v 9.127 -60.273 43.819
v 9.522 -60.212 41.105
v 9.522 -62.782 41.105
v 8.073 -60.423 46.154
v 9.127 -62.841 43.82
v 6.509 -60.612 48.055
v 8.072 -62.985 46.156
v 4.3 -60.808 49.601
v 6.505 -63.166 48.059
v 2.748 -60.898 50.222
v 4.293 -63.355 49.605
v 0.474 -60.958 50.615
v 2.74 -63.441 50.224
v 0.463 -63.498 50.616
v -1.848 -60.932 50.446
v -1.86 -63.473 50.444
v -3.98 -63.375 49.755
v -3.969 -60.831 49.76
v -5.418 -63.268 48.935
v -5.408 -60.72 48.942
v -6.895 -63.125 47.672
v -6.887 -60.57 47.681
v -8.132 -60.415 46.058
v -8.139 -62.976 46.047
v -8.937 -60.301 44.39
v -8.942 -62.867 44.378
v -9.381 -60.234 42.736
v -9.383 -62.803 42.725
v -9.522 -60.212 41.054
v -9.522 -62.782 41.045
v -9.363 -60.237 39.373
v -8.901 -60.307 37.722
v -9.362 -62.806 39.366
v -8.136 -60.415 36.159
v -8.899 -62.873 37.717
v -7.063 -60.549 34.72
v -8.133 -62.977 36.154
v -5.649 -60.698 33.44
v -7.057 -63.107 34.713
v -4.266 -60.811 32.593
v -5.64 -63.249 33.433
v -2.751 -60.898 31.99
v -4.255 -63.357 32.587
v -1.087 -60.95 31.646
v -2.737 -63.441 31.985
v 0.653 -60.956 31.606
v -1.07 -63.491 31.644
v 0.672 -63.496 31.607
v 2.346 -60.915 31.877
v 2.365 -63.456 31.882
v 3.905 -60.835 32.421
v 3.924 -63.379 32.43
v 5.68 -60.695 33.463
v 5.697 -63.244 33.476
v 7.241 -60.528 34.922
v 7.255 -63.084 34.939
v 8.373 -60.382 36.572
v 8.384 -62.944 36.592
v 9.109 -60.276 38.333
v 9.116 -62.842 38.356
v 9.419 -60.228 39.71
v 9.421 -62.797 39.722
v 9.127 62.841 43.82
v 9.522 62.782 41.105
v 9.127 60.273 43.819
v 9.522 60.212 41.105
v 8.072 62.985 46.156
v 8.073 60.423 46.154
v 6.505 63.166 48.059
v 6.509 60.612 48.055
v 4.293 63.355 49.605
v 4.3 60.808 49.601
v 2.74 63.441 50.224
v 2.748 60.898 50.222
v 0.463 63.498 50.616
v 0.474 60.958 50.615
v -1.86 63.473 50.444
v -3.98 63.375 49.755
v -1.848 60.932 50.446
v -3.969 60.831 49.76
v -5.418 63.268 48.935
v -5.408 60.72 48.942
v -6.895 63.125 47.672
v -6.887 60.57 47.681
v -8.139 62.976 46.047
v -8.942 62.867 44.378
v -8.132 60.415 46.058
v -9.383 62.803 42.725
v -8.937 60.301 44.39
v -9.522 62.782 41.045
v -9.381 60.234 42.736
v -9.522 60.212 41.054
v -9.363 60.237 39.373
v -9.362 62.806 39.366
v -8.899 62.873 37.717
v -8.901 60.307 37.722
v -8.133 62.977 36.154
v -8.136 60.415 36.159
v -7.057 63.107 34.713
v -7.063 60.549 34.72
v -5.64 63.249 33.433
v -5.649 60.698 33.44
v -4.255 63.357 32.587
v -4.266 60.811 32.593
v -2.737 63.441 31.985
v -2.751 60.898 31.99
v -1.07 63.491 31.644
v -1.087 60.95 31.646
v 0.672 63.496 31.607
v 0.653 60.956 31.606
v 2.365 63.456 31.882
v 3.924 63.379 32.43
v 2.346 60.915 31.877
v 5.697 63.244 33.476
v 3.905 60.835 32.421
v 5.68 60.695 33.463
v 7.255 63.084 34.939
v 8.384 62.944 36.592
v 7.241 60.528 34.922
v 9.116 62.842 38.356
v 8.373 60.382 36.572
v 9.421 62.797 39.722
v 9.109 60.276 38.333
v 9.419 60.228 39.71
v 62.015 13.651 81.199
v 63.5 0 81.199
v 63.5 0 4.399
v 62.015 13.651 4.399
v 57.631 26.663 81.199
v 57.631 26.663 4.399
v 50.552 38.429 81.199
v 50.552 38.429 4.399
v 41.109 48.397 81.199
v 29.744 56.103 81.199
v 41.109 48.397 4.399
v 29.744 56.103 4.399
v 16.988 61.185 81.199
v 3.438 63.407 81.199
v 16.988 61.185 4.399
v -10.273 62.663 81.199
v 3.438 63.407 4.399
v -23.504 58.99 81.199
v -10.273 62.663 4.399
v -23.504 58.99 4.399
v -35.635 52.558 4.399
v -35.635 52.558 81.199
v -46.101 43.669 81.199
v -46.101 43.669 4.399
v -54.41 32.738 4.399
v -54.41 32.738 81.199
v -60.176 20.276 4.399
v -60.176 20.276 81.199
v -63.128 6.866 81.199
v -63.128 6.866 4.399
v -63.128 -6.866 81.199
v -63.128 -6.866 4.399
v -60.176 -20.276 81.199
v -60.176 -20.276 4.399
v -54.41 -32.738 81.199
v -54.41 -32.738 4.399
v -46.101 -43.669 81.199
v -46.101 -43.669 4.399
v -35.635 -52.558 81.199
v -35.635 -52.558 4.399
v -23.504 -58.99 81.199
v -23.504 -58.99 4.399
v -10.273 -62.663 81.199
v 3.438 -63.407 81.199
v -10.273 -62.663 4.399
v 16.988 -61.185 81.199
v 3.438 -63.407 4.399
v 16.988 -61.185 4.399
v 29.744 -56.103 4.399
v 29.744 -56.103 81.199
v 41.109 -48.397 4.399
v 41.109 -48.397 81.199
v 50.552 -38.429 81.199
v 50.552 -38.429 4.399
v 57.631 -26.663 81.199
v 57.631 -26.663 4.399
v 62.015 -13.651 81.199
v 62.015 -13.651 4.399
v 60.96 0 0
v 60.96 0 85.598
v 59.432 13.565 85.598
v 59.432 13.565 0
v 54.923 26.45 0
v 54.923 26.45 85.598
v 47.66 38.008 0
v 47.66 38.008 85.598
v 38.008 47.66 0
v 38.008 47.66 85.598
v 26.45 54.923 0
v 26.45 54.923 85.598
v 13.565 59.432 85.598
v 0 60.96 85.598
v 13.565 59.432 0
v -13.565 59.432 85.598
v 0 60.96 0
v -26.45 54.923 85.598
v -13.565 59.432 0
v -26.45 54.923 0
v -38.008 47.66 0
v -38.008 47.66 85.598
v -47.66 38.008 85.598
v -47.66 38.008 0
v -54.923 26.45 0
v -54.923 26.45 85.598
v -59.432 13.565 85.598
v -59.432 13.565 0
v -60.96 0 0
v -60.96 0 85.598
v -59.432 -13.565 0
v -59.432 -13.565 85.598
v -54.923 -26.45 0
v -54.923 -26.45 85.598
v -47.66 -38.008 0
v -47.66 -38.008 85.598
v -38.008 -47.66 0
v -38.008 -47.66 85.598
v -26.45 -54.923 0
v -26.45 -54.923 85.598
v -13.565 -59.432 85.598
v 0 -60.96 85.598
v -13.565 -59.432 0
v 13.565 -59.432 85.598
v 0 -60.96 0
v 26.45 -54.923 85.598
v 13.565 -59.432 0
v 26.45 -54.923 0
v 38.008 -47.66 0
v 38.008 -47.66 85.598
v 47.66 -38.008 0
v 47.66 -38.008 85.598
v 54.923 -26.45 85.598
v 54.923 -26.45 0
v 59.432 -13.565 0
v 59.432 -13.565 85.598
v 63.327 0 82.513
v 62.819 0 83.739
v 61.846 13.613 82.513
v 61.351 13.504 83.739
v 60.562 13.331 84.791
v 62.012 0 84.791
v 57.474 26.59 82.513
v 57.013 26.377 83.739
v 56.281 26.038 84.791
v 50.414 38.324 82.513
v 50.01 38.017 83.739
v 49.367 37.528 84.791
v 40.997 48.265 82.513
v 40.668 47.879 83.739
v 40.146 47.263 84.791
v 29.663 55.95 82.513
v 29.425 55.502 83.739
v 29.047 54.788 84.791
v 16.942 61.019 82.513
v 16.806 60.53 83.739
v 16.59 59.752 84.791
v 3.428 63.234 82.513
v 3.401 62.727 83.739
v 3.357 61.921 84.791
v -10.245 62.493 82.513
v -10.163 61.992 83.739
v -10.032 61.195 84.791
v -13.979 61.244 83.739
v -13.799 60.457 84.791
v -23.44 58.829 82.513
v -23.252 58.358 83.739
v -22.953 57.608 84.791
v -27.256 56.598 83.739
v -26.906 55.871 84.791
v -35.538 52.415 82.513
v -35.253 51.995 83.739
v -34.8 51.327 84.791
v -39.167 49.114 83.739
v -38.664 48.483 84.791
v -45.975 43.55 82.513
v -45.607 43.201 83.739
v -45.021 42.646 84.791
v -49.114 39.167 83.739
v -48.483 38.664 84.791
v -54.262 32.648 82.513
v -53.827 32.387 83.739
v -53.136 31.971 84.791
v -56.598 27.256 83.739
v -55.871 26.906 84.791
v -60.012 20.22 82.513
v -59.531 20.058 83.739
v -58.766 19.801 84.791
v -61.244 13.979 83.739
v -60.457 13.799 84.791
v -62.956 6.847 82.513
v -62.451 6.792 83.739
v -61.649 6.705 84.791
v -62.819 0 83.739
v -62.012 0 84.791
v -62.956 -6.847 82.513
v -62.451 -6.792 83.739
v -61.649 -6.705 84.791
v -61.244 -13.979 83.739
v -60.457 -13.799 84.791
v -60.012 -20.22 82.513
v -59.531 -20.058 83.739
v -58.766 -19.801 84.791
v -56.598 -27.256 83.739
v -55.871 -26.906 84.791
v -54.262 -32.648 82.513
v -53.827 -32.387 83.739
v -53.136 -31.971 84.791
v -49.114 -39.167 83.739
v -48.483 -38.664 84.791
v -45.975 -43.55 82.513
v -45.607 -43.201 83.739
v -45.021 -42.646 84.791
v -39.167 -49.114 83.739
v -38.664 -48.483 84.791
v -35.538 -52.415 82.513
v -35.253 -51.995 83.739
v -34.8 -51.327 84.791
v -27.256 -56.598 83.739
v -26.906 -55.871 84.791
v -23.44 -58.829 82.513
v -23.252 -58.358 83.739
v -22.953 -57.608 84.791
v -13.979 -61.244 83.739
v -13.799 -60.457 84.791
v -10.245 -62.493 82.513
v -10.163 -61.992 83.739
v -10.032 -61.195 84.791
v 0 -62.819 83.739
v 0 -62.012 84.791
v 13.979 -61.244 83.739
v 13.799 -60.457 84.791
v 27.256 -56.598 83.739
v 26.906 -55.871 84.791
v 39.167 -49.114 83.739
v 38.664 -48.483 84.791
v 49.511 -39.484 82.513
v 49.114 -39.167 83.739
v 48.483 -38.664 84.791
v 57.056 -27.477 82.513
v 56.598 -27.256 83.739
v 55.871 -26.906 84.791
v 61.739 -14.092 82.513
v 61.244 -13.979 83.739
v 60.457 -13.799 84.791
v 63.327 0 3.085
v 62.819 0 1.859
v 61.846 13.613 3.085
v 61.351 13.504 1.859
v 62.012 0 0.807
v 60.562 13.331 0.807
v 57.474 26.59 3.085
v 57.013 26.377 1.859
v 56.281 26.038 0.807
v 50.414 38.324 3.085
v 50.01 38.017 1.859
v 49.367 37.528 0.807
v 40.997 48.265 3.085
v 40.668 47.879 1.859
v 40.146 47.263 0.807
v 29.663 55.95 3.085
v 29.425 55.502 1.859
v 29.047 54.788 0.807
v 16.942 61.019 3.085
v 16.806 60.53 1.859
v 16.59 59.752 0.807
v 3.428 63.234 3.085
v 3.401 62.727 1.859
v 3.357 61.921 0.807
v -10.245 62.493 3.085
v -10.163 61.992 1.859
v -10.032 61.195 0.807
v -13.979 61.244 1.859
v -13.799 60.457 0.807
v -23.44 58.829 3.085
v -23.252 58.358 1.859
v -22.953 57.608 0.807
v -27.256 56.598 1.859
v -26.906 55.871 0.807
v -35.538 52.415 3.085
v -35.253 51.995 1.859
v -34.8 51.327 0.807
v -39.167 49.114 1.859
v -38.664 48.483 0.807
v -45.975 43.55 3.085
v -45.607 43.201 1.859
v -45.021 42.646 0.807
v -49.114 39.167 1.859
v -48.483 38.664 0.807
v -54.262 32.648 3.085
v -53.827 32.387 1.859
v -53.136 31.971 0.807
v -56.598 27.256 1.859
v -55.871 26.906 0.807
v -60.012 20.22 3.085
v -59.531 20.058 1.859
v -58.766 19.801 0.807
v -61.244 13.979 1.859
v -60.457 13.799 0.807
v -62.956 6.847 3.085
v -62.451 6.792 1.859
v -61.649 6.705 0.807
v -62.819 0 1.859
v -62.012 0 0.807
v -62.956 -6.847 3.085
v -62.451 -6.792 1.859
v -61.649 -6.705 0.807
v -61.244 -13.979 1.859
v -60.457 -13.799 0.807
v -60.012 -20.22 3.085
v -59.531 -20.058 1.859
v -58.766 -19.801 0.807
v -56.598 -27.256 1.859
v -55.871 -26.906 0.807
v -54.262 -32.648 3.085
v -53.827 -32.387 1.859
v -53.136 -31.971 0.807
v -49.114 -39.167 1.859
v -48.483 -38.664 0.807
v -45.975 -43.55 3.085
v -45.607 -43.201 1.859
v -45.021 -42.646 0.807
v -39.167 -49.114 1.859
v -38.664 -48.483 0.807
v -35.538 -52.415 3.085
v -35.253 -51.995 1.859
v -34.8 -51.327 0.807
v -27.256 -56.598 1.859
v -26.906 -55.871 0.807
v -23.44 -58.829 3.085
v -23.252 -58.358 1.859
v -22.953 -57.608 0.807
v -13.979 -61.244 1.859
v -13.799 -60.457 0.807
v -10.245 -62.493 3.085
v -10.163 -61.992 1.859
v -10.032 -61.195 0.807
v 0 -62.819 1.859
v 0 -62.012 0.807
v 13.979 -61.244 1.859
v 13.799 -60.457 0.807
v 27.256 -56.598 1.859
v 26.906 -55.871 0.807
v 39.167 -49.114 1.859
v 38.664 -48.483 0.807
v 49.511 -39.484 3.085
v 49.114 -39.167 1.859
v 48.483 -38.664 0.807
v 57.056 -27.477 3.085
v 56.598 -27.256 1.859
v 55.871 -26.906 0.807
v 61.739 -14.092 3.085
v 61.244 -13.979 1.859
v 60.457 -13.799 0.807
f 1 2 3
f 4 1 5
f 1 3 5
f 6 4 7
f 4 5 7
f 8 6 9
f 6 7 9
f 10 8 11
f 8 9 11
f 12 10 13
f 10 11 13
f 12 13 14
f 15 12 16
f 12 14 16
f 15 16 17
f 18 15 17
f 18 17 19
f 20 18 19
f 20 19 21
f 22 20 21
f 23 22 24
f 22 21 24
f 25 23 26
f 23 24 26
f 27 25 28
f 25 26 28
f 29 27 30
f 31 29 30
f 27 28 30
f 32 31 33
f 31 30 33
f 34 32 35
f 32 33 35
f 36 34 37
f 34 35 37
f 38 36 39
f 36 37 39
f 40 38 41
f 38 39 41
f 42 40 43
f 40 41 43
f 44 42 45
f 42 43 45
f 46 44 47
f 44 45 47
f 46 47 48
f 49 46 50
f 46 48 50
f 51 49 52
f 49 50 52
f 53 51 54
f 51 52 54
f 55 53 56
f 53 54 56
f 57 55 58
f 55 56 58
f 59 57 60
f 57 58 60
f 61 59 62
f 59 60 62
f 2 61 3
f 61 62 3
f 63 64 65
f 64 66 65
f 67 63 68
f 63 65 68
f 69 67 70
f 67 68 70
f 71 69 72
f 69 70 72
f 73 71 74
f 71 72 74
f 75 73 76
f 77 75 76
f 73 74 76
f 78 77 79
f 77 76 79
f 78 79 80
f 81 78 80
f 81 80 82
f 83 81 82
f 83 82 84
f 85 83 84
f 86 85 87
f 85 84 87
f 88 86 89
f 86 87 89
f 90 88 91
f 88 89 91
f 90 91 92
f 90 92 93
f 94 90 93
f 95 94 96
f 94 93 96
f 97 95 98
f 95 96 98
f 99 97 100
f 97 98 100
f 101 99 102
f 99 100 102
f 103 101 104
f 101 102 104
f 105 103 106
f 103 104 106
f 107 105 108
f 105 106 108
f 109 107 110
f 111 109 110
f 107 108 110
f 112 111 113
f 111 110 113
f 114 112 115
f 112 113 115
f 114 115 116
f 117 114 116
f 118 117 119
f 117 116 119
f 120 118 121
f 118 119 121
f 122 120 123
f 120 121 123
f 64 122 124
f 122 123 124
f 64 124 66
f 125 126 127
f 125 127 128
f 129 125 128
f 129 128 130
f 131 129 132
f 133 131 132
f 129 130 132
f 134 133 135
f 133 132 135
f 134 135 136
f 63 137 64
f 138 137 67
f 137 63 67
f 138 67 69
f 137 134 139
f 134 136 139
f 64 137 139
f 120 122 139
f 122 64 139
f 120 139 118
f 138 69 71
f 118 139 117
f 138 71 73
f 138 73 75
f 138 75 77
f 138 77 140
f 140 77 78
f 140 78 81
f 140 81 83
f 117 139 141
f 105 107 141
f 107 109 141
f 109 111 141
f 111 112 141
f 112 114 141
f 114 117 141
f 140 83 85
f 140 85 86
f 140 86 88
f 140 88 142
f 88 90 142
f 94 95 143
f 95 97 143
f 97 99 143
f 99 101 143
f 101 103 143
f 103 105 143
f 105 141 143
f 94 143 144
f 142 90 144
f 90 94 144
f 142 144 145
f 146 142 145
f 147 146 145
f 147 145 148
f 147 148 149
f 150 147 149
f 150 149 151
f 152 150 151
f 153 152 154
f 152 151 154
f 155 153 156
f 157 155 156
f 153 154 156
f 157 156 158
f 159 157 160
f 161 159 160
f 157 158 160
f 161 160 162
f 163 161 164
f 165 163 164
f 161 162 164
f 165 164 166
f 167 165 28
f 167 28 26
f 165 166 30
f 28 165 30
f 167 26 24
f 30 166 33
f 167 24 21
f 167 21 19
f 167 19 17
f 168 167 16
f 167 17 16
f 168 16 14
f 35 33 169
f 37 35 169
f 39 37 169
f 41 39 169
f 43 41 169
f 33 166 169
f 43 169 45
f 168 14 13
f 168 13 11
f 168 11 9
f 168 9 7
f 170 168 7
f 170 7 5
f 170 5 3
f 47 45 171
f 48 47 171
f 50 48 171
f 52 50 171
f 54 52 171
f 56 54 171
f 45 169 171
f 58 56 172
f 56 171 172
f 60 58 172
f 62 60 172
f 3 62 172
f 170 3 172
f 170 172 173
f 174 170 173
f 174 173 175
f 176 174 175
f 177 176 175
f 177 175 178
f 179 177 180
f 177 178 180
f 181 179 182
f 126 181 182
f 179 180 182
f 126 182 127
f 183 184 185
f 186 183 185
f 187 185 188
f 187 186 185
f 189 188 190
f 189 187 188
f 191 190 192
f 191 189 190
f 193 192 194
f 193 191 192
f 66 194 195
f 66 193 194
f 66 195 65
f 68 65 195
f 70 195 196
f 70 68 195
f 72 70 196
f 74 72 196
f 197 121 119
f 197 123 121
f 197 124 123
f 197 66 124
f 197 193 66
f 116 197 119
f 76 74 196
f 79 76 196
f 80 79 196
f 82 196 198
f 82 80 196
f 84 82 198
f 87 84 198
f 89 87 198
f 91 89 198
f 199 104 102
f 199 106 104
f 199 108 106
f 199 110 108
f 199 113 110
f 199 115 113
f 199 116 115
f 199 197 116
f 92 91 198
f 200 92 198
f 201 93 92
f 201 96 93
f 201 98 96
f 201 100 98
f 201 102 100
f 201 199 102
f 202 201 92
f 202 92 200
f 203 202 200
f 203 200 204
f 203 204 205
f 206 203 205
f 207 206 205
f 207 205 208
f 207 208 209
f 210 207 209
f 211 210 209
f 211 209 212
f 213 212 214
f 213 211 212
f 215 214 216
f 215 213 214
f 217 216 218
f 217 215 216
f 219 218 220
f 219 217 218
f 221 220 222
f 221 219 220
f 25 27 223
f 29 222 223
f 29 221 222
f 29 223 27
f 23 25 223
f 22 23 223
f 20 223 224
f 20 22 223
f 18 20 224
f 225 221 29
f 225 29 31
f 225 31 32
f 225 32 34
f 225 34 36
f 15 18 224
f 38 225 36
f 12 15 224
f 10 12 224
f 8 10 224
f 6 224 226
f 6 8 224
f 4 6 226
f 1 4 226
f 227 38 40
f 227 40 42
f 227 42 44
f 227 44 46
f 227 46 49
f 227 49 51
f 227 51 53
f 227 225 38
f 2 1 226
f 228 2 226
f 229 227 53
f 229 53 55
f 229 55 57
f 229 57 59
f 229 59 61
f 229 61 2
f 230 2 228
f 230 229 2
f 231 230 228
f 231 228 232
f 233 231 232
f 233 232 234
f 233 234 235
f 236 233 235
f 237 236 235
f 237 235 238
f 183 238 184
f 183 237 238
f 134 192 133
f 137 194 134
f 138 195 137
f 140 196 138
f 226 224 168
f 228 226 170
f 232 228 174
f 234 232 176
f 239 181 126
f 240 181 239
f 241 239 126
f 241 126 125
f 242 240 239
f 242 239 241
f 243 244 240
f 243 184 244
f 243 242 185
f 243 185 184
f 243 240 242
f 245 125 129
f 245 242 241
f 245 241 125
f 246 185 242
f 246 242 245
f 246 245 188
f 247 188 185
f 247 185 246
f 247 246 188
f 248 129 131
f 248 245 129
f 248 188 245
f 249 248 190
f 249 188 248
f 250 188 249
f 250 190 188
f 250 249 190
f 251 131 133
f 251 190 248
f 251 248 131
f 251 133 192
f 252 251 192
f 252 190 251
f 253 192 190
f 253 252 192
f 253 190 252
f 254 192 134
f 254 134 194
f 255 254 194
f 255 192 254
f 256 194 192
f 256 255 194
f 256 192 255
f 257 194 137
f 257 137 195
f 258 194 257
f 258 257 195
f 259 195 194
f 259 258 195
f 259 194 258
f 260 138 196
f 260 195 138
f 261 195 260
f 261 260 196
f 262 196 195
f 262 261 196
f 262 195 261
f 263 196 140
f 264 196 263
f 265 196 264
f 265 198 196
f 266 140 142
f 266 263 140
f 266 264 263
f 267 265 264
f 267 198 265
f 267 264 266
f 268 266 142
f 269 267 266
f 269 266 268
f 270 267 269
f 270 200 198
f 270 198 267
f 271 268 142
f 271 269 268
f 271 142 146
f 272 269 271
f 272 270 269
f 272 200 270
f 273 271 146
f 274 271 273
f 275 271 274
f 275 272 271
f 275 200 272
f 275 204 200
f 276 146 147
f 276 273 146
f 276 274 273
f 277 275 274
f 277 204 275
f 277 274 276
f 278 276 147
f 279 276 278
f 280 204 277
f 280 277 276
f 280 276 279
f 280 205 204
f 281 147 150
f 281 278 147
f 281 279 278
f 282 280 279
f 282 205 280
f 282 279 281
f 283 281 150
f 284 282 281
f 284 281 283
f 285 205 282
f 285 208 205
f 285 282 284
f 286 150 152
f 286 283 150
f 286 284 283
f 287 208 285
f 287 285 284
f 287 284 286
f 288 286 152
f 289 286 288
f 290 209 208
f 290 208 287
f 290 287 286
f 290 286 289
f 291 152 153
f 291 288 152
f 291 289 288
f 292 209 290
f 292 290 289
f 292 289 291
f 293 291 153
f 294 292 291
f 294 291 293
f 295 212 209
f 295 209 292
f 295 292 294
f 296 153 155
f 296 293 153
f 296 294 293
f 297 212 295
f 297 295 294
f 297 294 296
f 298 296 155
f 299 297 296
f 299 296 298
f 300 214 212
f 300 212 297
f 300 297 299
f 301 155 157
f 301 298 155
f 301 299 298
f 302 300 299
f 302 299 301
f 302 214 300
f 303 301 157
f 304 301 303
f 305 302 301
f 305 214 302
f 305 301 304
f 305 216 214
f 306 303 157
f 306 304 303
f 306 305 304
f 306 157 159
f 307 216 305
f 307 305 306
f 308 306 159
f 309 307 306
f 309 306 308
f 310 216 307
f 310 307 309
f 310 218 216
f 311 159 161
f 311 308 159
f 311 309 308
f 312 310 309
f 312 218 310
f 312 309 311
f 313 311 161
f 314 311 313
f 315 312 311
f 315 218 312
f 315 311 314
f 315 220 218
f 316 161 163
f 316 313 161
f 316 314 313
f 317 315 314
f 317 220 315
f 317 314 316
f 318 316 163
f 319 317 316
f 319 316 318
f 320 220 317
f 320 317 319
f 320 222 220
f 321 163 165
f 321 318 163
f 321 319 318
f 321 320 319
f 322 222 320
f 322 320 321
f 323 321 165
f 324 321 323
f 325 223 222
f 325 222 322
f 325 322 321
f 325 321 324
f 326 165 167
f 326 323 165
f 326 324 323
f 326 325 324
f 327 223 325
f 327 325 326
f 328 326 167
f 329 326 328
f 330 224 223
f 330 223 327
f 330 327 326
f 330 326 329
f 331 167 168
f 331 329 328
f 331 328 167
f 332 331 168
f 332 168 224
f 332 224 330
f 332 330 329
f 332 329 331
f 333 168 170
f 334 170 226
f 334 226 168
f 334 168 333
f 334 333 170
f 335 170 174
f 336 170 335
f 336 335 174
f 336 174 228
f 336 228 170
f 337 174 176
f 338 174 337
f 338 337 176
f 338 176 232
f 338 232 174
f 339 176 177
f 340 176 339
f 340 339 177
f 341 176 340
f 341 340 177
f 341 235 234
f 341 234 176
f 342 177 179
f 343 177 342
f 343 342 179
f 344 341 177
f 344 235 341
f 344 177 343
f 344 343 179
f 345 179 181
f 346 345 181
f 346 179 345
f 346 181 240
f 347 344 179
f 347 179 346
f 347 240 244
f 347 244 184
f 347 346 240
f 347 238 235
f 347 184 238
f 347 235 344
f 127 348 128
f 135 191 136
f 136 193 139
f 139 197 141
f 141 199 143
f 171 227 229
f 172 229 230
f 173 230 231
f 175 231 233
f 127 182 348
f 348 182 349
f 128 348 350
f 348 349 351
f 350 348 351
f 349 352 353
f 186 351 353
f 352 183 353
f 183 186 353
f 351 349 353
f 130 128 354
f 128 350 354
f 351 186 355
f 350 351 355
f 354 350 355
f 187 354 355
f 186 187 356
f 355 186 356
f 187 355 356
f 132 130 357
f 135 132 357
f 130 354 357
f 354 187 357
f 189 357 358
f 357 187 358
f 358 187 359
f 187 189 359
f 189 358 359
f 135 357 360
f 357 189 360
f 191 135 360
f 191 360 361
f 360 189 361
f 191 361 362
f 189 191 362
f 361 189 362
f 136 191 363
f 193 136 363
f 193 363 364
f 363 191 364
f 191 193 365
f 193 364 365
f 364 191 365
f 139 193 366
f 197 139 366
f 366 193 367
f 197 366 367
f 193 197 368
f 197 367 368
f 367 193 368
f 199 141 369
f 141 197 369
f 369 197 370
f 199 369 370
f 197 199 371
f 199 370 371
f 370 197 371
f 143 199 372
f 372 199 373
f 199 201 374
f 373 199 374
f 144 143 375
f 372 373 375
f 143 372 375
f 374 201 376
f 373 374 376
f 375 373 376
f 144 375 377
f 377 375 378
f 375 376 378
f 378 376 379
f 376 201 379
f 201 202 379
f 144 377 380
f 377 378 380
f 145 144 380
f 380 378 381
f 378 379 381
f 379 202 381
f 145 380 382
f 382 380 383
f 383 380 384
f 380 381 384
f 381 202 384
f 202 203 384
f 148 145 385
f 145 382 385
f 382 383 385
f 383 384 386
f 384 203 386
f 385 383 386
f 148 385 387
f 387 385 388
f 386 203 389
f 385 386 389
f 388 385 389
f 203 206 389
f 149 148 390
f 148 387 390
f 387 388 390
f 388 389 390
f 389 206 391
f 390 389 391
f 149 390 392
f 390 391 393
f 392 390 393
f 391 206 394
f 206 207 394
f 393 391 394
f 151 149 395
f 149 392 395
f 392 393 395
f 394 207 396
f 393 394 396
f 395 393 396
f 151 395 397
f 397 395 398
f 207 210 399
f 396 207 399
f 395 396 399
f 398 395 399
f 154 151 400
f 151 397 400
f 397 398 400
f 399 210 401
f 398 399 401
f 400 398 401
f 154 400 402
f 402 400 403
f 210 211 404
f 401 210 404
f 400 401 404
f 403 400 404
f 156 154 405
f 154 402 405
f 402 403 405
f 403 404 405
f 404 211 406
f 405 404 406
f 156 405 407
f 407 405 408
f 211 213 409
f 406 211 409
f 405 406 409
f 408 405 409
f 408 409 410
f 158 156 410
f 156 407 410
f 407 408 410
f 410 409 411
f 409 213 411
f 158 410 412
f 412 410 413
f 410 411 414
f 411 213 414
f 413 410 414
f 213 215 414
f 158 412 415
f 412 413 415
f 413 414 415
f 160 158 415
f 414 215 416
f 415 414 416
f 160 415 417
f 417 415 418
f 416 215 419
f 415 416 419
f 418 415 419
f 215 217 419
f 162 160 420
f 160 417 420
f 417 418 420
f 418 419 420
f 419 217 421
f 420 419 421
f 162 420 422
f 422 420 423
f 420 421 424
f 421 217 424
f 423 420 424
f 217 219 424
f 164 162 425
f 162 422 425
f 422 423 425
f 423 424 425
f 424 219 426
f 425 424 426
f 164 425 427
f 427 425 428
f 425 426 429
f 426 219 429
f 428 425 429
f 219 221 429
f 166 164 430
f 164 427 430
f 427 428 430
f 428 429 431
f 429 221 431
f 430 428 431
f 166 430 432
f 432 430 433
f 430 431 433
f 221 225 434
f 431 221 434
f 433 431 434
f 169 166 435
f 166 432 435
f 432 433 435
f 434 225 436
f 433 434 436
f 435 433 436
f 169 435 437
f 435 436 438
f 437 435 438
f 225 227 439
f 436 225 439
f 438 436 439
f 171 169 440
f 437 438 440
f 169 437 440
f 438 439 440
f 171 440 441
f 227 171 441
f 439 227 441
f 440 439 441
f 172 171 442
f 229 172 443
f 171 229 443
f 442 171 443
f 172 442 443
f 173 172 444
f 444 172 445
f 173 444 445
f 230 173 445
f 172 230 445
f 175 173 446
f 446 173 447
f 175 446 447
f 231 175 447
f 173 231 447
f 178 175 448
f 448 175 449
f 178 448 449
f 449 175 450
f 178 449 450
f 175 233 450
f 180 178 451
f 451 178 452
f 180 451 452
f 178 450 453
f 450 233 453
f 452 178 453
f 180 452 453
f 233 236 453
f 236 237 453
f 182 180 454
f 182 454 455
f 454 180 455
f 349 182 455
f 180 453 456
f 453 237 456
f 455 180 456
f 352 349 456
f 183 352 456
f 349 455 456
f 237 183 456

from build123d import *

# Parameters (mm, degrees)
F0_R     = 63.5
F1_DEPTH = 85.598
F2_T     = -2.54
F3_R     = 9.5217645964
F4_DEPTH = 92.964


# Not quite as in the source:
# - a fillet or chamfer that OpenCascade refuses, or shapes differently, is made with other operations: its cross-section is extruded or revolved along the edge and cut away or added


with BuildPart() as f1:
    # F0 (on Top) → F1 (new body)
    with BuildSketch(Plane.XY):
        Circle(F0_R)
    extrude(amount=F1_DEPTH)

    # F2
    f2_openings = [f1.faces().sort_by_distance(p)[0] for p in [
        (0, 0, 85.598),
        (0, 0, 0),
    ]]
    offset(amount=F2_T, openings=f2_openings)

    # F3 (on Front) → F4 (cut, symmetric)
    with BuildSketch(Plane.XZ):
        with Locations((0, 41.1053188145)):
            Circle(F3_R)
    extrude(amount=F4_DEPTH, both=True, mode=Mode.SUBTRACT)

    # F5: fillet of radius 5.08 on 2 edges, made by hand

    # F5_s1 → F5_t2 (revolve, cut)
    with BuildSketch(Plane.XZ):
        with BuildLine():
            ThreePointArc((63.5, 81.1985909488), (62.8194090512, 83.7385909488), (60.96, 85.598))
            Line((60.96, 85.598), (63.5, 85.598))
            Line((63.5, 85.598), (63.5, 81.1985909488))
        make_face()
    revolve(axis=Axis((0, 0, 85.598), (0, 0, 1)), mode=Mode.SUBTRACT)

    # F5_s3 → F5_t4 (revolve, cut)
    with BuildSketch(Plane.XZ):
        with BuildLine():
            ThreePointArc((63.5, 4.3994090512), (62.8194090512, 1.8594090512), (60.96, 0))
            Line((60.96, 0), (63.5, 0))
            Line((63.5, 0), (63.5, 4.3994090512))
        make_face()
    revolve(axis=Axis((0, 0, 0), (0, 0, 1)), mode=Mode.SUBTRACT)


solid = f1.part
